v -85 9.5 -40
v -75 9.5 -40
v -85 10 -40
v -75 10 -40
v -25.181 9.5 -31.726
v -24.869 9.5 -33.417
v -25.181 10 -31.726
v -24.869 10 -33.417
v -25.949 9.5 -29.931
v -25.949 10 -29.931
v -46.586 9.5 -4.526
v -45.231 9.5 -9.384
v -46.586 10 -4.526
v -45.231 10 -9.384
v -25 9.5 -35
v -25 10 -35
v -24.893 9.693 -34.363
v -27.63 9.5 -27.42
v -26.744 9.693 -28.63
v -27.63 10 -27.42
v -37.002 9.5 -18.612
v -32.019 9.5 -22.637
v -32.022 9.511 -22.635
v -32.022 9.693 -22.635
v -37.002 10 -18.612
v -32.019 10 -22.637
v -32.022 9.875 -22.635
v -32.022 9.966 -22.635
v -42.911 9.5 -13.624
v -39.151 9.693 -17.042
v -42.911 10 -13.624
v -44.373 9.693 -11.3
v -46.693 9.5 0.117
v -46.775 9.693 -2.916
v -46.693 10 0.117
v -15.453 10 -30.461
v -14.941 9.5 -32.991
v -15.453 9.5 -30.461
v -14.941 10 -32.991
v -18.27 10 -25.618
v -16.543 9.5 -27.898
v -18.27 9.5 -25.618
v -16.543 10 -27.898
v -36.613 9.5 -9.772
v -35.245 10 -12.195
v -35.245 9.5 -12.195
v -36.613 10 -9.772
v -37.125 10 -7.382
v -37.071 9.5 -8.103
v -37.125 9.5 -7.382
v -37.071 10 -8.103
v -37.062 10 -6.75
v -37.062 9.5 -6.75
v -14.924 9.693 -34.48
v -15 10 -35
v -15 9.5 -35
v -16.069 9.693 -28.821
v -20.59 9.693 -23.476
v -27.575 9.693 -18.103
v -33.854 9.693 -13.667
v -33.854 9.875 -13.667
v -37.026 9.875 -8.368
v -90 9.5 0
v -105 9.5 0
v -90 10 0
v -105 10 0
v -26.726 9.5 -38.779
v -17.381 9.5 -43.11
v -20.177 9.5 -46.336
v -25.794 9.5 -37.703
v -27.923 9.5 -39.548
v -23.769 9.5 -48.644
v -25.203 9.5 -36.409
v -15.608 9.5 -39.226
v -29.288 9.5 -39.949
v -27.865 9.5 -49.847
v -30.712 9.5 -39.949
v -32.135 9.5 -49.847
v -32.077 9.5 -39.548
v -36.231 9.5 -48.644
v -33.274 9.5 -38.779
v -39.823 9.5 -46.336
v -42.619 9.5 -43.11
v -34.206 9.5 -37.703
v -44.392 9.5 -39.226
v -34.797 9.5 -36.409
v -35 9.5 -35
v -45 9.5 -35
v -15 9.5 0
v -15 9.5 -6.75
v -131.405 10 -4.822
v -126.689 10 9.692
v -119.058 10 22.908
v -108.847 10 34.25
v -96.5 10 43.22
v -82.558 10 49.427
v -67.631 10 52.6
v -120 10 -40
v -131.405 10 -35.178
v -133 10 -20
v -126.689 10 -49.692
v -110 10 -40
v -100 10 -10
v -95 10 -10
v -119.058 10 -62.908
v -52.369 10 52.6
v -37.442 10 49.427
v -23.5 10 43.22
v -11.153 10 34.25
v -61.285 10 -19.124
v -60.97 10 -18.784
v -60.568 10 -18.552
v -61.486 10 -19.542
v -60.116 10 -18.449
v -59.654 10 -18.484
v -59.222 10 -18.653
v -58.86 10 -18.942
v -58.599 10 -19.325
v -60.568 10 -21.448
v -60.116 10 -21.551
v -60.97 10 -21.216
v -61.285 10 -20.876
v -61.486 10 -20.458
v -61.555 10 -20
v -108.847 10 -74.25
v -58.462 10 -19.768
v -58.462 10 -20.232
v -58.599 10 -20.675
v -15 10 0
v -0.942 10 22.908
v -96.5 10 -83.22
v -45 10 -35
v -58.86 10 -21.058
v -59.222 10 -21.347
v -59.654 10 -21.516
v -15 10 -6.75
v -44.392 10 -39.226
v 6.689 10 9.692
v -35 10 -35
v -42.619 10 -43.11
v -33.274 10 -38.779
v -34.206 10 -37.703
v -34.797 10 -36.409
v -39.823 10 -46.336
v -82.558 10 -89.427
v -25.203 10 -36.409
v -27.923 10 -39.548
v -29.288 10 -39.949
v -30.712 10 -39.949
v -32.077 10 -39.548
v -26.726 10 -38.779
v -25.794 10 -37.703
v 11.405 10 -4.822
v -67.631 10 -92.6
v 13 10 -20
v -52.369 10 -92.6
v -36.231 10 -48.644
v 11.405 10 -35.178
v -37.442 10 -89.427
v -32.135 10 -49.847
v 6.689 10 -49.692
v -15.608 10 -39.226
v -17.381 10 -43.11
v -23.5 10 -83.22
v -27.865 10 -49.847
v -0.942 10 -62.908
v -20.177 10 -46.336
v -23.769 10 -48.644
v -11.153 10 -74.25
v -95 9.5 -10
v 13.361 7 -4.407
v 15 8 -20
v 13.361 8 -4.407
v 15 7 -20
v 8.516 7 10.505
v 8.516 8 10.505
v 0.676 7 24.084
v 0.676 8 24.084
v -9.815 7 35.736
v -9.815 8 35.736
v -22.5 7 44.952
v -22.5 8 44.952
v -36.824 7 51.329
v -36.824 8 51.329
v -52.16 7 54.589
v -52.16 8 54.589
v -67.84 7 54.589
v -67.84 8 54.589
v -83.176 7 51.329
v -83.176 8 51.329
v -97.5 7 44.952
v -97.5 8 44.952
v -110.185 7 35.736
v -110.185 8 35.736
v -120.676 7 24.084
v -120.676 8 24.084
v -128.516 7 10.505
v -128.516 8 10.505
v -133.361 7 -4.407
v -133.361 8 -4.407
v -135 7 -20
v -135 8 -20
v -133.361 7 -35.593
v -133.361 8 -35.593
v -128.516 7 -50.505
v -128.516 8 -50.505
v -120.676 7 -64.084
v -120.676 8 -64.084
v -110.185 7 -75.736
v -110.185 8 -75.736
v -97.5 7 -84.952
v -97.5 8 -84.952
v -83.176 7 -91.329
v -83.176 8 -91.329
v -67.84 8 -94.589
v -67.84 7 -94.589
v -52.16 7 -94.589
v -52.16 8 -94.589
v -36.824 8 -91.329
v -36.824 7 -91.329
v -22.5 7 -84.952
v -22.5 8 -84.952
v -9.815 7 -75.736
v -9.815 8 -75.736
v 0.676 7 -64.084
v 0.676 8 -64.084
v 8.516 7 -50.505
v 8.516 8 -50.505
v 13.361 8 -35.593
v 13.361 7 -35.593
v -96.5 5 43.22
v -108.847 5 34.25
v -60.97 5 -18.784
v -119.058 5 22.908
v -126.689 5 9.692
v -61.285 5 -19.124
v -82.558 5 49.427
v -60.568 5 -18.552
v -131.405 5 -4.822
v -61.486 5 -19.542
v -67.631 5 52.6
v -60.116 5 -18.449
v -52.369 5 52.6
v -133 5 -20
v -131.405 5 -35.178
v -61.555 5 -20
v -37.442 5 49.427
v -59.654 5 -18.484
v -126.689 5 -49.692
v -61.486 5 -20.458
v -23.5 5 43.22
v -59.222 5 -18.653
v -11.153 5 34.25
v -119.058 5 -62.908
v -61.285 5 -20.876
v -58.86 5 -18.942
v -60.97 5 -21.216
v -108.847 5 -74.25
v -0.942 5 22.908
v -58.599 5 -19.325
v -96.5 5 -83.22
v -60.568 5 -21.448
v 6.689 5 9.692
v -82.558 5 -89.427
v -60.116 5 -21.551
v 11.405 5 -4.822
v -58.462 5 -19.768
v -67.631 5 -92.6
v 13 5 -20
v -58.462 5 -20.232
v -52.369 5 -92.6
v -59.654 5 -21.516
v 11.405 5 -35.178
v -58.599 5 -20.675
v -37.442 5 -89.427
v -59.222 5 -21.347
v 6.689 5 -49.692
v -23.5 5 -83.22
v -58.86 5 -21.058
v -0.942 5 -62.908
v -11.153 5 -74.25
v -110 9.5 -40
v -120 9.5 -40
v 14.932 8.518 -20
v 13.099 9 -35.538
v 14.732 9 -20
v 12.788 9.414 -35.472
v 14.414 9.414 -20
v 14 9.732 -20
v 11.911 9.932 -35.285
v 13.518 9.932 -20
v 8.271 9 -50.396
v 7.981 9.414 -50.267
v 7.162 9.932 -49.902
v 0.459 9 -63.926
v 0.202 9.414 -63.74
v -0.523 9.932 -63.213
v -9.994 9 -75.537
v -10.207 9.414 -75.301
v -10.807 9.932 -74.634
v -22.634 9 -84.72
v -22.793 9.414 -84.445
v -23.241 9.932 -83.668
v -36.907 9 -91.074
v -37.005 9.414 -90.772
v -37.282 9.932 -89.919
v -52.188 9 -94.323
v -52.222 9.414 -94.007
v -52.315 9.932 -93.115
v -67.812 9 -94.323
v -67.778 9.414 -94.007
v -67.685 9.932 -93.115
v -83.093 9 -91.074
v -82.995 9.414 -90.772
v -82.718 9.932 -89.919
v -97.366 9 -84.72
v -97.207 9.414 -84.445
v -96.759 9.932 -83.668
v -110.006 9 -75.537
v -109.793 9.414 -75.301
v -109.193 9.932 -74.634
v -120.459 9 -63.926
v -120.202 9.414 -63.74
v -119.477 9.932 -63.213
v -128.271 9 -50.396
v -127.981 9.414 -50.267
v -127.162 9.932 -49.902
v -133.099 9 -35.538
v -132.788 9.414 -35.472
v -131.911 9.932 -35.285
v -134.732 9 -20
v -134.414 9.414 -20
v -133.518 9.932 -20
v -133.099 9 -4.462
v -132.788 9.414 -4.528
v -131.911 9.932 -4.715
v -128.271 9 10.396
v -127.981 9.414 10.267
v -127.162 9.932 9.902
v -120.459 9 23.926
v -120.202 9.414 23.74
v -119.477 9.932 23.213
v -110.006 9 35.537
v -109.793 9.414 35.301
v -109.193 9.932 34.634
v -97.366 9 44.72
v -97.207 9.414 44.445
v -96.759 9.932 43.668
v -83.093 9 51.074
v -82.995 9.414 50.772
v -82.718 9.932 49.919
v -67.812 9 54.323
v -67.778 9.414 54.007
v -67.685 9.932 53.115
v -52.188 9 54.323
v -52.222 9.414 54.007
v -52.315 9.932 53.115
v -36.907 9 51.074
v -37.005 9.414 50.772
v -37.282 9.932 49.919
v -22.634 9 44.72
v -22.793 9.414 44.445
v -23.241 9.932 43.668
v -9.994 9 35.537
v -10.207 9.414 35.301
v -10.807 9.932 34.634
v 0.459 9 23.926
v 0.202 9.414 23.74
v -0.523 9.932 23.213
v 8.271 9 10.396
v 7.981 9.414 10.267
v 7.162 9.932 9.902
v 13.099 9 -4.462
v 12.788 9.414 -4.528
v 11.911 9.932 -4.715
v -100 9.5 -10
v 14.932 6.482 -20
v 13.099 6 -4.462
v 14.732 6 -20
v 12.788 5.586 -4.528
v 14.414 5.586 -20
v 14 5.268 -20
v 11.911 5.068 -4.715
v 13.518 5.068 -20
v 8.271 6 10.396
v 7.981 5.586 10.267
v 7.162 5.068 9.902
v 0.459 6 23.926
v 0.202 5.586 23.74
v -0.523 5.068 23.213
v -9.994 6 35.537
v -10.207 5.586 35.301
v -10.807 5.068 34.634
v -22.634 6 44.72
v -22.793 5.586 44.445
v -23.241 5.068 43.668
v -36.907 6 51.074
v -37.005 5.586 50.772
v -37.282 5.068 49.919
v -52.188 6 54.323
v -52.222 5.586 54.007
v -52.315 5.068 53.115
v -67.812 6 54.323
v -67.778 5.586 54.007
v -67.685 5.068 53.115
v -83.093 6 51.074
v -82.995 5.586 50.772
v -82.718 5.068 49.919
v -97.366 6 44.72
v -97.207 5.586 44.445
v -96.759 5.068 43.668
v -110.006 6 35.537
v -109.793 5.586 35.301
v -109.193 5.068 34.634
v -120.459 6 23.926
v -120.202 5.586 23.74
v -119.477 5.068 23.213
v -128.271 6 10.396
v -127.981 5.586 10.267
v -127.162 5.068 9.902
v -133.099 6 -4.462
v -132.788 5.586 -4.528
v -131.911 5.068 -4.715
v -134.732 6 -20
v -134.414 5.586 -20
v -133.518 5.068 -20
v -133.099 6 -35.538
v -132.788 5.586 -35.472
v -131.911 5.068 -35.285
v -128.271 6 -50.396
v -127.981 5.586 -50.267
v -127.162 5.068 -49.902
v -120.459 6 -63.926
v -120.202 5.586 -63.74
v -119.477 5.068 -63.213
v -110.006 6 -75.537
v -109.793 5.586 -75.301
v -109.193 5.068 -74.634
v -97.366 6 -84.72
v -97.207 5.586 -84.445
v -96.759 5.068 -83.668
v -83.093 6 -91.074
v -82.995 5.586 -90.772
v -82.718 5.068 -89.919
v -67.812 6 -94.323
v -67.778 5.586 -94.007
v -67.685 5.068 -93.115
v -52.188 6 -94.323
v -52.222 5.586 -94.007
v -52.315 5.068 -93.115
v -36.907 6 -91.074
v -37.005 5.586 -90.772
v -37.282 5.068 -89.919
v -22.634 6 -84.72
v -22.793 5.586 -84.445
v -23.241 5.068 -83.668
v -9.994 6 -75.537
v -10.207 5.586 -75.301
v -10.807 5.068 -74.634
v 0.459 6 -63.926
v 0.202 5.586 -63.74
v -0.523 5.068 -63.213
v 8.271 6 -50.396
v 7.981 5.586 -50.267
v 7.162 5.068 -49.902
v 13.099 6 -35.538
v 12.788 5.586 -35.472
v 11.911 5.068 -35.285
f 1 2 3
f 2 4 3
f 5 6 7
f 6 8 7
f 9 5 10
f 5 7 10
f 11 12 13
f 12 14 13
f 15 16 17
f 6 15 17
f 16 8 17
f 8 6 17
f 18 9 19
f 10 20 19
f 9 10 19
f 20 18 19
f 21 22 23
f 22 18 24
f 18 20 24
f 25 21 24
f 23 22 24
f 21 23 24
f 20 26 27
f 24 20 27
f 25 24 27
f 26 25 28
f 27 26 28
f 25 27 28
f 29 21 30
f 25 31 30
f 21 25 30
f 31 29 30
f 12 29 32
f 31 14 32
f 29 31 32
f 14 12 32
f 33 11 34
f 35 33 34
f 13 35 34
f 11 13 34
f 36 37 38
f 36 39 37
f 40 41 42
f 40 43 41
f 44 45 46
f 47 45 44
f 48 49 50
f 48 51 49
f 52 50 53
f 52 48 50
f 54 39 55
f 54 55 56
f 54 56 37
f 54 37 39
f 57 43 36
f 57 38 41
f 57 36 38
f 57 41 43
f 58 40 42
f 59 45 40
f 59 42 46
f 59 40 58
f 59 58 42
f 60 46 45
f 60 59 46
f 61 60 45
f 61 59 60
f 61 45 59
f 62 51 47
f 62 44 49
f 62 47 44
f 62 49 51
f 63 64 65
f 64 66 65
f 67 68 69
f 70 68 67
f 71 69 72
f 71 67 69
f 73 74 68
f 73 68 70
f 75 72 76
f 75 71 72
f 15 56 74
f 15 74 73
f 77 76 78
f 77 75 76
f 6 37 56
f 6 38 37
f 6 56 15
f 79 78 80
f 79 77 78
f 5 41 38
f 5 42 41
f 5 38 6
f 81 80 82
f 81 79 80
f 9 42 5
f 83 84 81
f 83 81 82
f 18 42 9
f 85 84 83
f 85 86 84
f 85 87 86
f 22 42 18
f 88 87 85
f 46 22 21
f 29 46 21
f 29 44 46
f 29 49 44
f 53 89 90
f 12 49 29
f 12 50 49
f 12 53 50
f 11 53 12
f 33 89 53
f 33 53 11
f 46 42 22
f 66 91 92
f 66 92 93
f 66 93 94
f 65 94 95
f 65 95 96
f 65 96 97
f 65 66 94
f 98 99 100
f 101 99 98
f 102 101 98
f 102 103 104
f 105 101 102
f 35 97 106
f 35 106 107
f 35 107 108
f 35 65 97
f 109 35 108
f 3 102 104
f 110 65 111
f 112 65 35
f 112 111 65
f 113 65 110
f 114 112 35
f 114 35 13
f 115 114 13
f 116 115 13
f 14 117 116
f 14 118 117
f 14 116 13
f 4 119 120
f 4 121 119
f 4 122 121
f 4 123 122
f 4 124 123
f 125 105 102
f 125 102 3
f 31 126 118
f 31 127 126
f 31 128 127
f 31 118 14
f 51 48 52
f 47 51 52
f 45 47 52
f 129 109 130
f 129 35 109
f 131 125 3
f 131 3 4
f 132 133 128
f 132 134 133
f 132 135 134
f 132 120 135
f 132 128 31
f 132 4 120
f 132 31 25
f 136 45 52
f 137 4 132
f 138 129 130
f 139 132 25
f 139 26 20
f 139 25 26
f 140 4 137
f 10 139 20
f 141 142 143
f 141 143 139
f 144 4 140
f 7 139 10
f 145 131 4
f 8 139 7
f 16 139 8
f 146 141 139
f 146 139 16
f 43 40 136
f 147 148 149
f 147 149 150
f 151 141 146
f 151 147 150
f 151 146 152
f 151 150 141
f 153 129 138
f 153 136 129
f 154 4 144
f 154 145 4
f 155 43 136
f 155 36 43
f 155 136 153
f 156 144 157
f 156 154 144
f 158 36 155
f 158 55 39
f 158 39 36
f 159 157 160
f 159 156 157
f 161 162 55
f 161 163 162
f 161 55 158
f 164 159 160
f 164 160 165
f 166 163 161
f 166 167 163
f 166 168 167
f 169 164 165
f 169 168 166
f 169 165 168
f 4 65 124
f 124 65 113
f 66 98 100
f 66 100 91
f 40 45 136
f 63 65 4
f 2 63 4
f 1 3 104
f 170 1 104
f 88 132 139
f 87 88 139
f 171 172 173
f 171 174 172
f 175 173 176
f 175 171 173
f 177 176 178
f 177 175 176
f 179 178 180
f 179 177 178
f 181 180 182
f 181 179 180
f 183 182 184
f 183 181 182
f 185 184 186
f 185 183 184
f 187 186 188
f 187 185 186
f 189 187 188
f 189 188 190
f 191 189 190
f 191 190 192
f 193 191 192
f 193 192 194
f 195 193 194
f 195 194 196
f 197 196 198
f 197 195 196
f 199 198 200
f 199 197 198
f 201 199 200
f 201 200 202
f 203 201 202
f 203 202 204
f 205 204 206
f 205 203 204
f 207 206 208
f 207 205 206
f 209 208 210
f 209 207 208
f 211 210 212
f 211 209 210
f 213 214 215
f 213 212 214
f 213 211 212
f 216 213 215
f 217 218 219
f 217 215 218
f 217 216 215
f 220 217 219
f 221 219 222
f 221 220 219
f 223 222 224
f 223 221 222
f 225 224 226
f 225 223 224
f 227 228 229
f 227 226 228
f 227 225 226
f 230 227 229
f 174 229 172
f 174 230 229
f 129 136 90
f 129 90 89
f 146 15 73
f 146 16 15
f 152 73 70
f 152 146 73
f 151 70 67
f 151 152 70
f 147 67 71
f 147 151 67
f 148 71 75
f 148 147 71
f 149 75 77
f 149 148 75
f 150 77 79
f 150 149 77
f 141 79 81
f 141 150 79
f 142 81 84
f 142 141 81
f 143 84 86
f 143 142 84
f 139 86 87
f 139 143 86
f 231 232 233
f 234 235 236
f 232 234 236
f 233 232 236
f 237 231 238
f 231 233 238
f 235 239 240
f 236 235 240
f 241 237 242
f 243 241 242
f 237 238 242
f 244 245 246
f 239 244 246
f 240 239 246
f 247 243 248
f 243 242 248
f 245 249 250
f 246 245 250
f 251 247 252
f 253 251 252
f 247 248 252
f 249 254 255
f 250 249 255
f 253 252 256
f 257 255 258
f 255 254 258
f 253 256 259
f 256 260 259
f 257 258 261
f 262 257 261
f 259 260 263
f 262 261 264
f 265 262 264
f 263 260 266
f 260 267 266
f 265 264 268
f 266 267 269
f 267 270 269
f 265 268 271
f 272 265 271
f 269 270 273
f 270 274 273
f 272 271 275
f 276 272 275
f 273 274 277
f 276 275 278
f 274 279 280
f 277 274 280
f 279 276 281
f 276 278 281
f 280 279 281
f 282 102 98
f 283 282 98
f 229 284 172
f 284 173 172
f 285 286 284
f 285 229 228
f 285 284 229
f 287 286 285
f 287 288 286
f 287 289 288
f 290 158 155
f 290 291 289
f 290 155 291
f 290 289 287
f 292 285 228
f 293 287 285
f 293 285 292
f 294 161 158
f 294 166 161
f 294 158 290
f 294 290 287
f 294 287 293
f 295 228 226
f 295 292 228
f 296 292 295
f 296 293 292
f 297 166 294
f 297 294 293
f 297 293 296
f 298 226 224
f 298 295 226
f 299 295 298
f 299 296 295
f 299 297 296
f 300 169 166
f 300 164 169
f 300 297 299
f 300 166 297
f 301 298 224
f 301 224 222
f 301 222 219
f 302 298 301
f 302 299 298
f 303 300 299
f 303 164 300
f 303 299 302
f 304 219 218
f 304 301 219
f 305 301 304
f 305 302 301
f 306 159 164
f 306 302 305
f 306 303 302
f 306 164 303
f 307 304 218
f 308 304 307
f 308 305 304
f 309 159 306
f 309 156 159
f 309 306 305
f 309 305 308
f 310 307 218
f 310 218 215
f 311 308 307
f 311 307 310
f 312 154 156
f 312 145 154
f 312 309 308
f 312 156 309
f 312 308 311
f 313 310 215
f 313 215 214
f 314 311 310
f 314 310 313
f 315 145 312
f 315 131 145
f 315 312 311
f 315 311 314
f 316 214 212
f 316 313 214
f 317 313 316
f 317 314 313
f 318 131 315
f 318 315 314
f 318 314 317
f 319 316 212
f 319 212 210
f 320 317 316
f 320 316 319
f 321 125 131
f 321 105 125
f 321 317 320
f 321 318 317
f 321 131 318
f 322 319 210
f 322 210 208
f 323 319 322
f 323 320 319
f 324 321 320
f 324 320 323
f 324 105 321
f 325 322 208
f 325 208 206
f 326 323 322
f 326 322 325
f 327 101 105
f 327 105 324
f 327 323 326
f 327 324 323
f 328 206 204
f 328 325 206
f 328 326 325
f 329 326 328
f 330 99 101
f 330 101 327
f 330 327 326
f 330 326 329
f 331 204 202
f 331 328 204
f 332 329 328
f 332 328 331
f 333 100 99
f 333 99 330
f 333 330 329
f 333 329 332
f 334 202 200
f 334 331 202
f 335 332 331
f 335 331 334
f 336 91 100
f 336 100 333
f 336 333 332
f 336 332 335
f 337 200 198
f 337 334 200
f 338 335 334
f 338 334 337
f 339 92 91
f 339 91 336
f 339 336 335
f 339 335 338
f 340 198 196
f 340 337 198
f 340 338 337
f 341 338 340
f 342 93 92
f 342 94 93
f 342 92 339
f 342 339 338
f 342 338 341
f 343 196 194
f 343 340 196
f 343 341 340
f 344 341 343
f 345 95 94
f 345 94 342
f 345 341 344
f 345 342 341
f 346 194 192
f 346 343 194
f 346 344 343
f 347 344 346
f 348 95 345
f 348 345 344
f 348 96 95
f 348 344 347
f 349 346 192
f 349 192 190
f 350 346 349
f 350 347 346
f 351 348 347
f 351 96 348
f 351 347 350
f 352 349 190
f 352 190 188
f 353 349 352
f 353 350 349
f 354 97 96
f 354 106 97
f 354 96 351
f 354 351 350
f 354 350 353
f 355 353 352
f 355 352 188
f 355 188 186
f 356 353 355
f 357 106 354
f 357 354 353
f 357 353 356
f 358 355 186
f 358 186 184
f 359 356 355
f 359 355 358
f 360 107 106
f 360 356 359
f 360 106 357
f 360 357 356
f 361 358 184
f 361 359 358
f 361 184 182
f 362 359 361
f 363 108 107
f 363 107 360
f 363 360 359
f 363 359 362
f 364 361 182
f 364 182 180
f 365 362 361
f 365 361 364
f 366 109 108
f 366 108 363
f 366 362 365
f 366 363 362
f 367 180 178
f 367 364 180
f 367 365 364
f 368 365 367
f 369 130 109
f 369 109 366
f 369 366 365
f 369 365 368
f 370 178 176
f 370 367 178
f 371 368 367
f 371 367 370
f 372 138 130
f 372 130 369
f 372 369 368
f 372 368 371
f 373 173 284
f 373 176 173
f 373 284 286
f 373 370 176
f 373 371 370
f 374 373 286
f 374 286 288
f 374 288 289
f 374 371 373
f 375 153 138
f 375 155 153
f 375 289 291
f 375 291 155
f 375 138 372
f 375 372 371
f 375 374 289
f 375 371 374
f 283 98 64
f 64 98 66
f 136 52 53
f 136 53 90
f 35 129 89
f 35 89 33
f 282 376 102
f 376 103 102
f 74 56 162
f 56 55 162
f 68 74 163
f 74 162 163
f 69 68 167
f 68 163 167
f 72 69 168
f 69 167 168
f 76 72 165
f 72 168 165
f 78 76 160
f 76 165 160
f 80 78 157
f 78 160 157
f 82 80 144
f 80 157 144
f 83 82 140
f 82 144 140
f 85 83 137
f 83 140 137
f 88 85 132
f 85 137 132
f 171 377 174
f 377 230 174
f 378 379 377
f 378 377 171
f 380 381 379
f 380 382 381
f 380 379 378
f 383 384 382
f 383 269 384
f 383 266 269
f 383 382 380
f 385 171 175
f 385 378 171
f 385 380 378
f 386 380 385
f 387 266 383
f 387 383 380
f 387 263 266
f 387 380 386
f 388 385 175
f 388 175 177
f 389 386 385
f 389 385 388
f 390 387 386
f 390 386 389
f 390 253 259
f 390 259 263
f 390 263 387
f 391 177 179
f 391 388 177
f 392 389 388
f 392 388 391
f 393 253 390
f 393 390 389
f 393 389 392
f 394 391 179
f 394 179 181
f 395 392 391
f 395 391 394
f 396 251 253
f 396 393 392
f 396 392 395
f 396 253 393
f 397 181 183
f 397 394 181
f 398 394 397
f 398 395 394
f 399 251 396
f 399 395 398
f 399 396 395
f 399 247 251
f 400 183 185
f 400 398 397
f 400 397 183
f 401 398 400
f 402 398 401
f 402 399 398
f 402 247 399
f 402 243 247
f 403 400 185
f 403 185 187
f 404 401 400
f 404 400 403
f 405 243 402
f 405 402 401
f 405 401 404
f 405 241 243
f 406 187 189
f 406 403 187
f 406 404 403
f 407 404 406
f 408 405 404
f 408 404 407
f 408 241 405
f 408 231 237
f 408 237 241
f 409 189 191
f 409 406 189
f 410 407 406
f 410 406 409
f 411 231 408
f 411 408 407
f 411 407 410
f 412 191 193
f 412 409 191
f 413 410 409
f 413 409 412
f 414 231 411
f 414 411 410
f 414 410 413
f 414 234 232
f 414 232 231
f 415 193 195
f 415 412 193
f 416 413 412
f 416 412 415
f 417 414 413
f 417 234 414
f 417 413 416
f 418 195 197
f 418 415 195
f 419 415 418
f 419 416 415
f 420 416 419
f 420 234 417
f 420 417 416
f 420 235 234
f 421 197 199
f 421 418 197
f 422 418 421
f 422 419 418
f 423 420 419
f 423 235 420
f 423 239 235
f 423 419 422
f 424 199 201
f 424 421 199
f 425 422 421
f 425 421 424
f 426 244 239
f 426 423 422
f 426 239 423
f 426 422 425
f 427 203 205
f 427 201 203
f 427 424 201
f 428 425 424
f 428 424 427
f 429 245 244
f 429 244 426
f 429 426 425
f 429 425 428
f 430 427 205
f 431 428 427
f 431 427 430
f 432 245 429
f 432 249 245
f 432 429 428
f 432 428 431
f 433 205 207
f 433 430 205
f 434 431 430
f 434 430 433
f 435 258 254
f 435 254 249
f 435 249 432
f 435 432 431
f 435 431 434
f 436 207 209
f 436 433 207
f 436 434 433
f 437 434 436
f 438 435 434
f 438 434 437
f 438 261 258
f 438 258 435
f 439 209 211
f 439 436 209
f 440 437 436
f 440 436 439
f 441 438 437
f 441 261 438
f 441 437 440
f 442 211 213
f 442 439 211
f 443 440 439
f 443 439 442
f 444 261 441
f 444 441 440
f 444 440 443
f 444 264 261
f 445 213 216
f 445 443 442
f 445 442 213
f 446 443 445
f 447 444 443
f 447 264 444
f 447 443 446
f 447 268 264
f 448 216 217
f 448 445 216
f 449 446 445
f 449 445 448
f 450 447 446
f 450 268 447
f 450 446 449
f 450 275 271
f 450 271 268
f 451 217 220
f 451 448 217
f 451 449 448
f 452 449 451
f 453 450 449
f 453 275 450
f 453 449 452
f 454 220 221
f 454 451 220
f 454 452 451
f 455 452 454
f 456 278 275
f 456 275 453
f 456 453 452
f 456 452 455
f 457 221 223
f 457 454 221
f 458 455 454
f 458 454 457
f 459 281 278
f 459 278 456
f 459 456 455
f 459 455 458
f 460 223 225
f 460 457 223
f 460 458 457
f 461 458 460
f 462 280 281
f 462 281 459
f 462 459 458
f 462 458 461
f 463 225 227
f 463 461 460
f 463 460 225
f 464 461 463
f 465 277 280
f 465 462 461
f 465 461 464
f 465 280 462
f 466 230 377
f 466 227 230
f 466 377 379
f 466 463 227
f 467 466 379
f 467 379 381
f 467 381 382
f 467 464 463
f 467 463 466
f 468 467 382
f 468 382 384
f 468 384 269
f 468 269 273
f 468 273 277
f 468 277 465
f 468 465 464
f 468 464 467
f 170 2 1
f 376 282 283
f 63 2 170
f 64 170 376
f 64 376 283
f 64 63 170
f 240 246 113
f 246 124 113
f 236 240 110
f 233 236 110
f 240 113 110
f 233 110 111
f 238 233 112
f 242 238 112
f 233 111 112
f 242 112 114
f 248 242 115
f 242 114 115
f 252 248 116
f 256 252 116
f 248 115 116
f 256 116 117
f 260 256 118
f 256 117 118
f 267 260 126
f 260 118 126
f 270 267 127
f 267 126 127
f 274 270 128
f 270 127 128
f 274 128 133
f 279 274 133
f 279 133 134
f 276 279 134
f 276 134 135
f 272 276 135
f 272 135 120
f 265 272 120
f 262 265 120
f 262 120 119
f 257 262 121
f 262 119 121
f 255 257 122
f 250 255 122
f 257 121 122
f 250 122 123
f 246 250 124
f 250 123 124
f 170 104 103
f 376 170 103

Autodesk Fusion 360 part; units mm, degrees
sketch "Sketch1" plane through (0, 0, 0) normal (0, 1, 0) x (1, 0, 0)
  circle A0 centre (0, 0) radius 150
  dimension "d1" = 300
extrude "Extrude1" add sketch "Sketch1" along normal blind 10
fillet "Fillet1" radius 4 1 edges at (-139.8491, 10, 54.2423)
fillet "Fillet2" radius 4 1 edges at (-139.8491, 0, 54.2423)
sketch "Sketch2" plane through (0, 0, 0) normal (0, -1, 0) x (1, 0, 0)
  circle A0 centre (0, 0) radius 146
sketch "Sketch3" plane through (0, 0, 0) normal (0, 1, 0) x (1, 0, 0)
  circle A0 centre (0, 0) radius 1.555
  dimension "d12" = 3.11
extrude "Extrude2" cut sketch "Sketch3" along normal blind 11
sketch "Sketch4" plane through (0, 10, 0) normal (0, 1, 0) x (-1, 0, 0)
  circle A0 centre (0, 0) radius 1.555
  circle A1 centre (0, 0) radius 146
  line L0 (120, -40) -> (90, 40)
  line L1 (90, 40) -> (60, 40)
  line L2 (60, 40) -> (30, -40)
  line L3 (30, -40) -> (50, -40)
  line L4 (50, -40) -> (70, 20)
  line L5 (70, 20) -> (80, 20)
  line L6 (80, 20) -> (100, -40)
  line L7 (100, -40) -> (120, -40)
  line L8 (-30, -30) -> (-50, -30)
  arc A2 (-70, -30) -> (-50, -30) centre (-60, -30) ccw
  arc A3 (-90, -30) -> (-30, -30) centre (-60, -30) ccw
  spline S0 degree 5 poles (-70, -30) (-70.0634, -29.7236) (-70.1723, -29.1665) (-70.2819, -28.3178) (-70.3207, -27.1599) (-70.1889, -25.6686) (-69.8751, -24.1335) (-69.376, -22.5546) (-68.6884, -20.9329) (-67.8134, -19.2713) (-66.7594, -17.5764) (-65.547, -15.8596) (-64.2094, -14.1377) (-62.7845, -12.4293) (-61.3071, -10.7508) (-59.8021, -9.1139) (-58.2756, -7.5214) (-56.7101, -5.965) (-55.0757, -4.4303) (-53.3406, -2.9009) (-51.4819, -1.3633) (-49.4955, 0.189) (-47.4087, 1.7499) (-45.2741, 3.3045) (-43.1564, 4.8358) (-41.1228, 6.3305) (-39.2311, 7.7847) (-37.5194, 9.21) (-35.9935, 10.6403) (-34.6345, 12.1238) (-33.4107, 13.7116) (-32.2874, 15.4473) (-31.2375, 17.3568) (-30.2526, 19.4371) (-29.3384, 21.6635) (-28.5106, 23.9969) (-27.7898, 26.3921) (-27.1977, 28.8042) (-26.7512, 31.1975) (-26.4611, 33.5493) (-26.3334, 35.8458) (-26.3632, 37.6333) (-26.46, 38.9452) (-26.5577, 39.8069) (-26.6147, 40.2346) knots 0 0 0 0 0 0 0.025 0.05 0.075 0.1 0.125 0.15 0.175 0.2 0.225 0.25 0.275 0.3 0.325 0.35 0.375 0.4 0.425 0.45 0.475 0.5 0.525 0.55 0.575 0.6 0.625 0.65 0.675 0.7 0.725 0.75 0.775 0.8 0.825 0.85 0.875 0.9 0.925 0.95 0.975 1 1 1 1 1 1
  spline S1 degree 5 poles (-90, -30) (-90.0442, -29.7838) (-90.1209, -29.3378) (-90.2007, -28.6279) (-90.2365, -27.5994) (-90.1634, -26.1809) (-89.9721, -24.6411) (-89.6627, -23.0046) (-89.2357, -21.3104) (-88.6909, -19.6034) (-88.0272, -17.9257) (-87.2416, -16.31) (-86.328, -14.7695) (-85.2785, -13.2964) (-84.0856, -11.8706) (-82.7446, -10.4656) (-81.2559, -9.0553) (-79.6283, -7.6214) (-77.8793, -6.1572) (-76.0322, -4.6645) (-74.114, -3.1522) (-72.1524, -1.6337) (-70.1735, -0.1252) (-68.1991, 1.3564) (-66.2443, 2.796) (-64.3188, 4.1811) (-62.4289, 5.504) (-60.5798, 6.763) (-58.7772, 7.9643) (-57.0291, 9.1229) (-55.3486, 10.266) (-53.7526, 11.4282) (-52.2604, 12.6449) (-50.8915, 13.9443) (-49.6636, 15.3415) (-48.5909, 16.8301) (-47.6823, 18.3787) (-46.9432, 19.942) (-46.3762, 21.4701) (-45.982, 22.9167) (-45.7603, 24.2509) (-45.7206, 25.2167) (-45.768, 25.8818) (-45.8338, 26.299) (-45.8753, 26.5009) knots 0 0 0 0 0 0 0.025 0.05 0.075 0.1 0.125 0.15 0.175 0.2 0.225 0.25 0.275 0.3 0.325 0.35 0.375 0.4 0.425 0.45 0.475 0.5 0.525 0.55 0.575 0.6 0.625 0.65 0.675 0.7 0.725 0.75 0.775 0.8 0.825 0.85 0.875 0.9 0.925 0.95 0.975 1 1 1 1 1 1
  line L9 (-45.8753, 26.5009) -> (-90, 26.5009)
  line L10 (-90, 26.5009) -> (-90, 40)
  line L11 (-90, 40) -> (-26.6147, 40.2346)
  point P0 (-70, -24.8518)
  point P1 (-67, -18)
  point P2 (-60, -9.3422)
  point P3 (-51, -1)
  point P4 (-39, 8)
  point P5 (-32.2588, 15.5698)
  point P6 (-27.4521, 27.8408)
  point P7 (-90, -25)
  point P8 (-87.5787, -17.0448)
  point P9 (-81.7168, -9.508)
  point P10 (-70, 0)
  point P11 (-58.1016, 8.4127)
  point P12 (-50, 15)
  point P13 (-46.2103, 22.1464)
extrude "Extrude3" cut sketch "Sketch4" against normal blind 1 contours L0 L1 L2 L3 L4 L5 L6 L7 | L8 A2 A3 S0 S1 L9 L10 L11
scale "Scale1" factor 0.5 about (-120, 10, -40) bodies 1
sketch "Sketch5" plane through (0, 10, 0) normal (0, 1, 0) x (-1, 0, 0)
  line L0 (105, 0) -> (120, -40)
  line L1 (120, -40) -> (110, -40)
  line L2 (110, -40) -> (100, -10)
  line L3 (100, -10) -> (95, -10)
  line L4 (95, -10) -> (85, -40)
  line L5 (85, -40) -> (75, -40)
  line L6 (75, -40) -> (90, 0)
  line L7 (90, 0) -> (105, 0)
  line L8 (35, -35) -> (45, -35)
  arc A0 (15, -35) -> (45, -35) centre (30, -35) ccw
  spline S0 degree 5 poles (15, -35) (14.9779, -34.8919) (14.9396, -34.6689) (14.8997, -34.3139) (14.8818, -33.7997) (14.9183, -33.0904) (15.0139, -32.3206) (15.1686, -31.5023) (15.3821, -30.6552) (15.6545, -29.8017) (15.9864, -28.9629) (16.3792, -28.155) (16.836, -27.3848) (17.3607, -26.6482) (17.9572, -25.9353) (18.6277, -25.2328) (19.372, -24.5277) (20.1858, -23.8107) (21.0604, -23.0786) (21.9839, -22.3322) (22.943, -21.5761) (23.9238, -20.8169) (24.9133, -20.0626) (25.9004, -19.3218) (26.8778, -18.602) (27.8406, -17.9094) (28.7856, -17.248) (29.7101, -16.6185) (30.6114, -16.0179) (31.4854, -15.4385) (32.3257, -14.867) (33.1237, -14.2859) (33.8698, -13.6776) (34.5542, -13.0279) (35.1682, -12.3293) (35.7046, -11.585) (36.1589, -10.8107) (36.5284, -10.029) (36.8119, -9.265) (37.009, -8.5416) (37.1199, -7.8746) (37.1397, -7.3916) (37.116, -7.0591) (37.0831, -6.8505) (37.0623, -6.7495) knots 0 0 0 0 0 0 0.025 0.05 0.075 0.1 0.125 0.15 0.175 0.2 0.225 0.25 0.275 0.3 0.325 0.35 0.375 0.4 0.425 0.45 0.475 0.5 0.525 0.55 0.575 0.6 0.625 0.65 0.675 0.7 0.725 0.75 0.775 0.8 0.825 0.85 0.875 0.9 0.925 0.95 0.975 1 1 1 1 1 1
  line L9 (37.0623, -6.7495) -> (15, -6.7495)
  line L10 (15, -6.7495) -> (15, 0)
  line L11 (15, 0) -> (46.6926, 0.1173)
  spline S1 degree 5 poles (46.6926, 0.1173) (46.7212, -0.0965) (46.77, -0.5274) (46.8184, -1.1833) (46.8333, -2.0771) (46.7694, -3.2253) (46.6244, -4.4012) (46.4012, -5.5979) (46.1051, -6.804) (45.7447, -8.0015) (45.3308, -9.1683) (44.8737, -10.2814) (44.3812, -11.3216) (43.8563, -12.2763) (43.2946, -13.1442) (42.6827, -13.9381) (42.0033, -14.6798) (41.2403, -15.395) (40.3845, -16.1076) (39.4386, -16.8347) (38.4218, -17.5821) (37.363, -18.3478) (36.2956, -19.1251) (35.2523, -19.9055) (34.259, -20.6816) (33.3297, -21.4504) (32.4621, -22.2152) (31.645, -22.9825) (30.8622, -23.7607) (30.099, -24.5569) (29.3464, -25.3754) (28.6078, -26.2146) (27.8953, -27.0689) (27.2265, -27.9298) (26.6203, -28.7882) (26.0933, -29.6357) (25.6558, -30.4664) (25.312, -31.2773) (25.0624, -32.0667) (24.9055, -32.8343) (24.8397, -33.5799) (24.859, -34.1589) (24.9139, -34.5833) (24.9683, -34.8618) (25, -35) knots -1 -1 -1 -1 -1 -1 -0.975 -0.95 -0.925 -0.9 -0.875 -0.85 -0.825 -0.8 -0.775 -0.75 -0.725 -0.7 -0.675 -0.65 -0.625 -0.6 -0.575 -0.55 -0.525 -0.5 -0.475 -0.45 -0.425 -0.4 -0.375 -0.35 -0.325 -0.3 -0.275 -0.25 -0.225 -0.2 -0.175 -0.15 -0.125 -0.1 -0.075 -0.05 -0.025 0 0 0 0 0 0
  arc A1 (25, -35) -> (35, -35) centre (30, -35) ccw
  circle A2 centre (60, -20) radius 0.7775
  circle A3 centre (60, -20) radius 73
  circle A4 centre (60, -20) radius 1.555
  dimension "d18" = 3.11
extrude "Extrude4" cut sketch "Sketch5" against normal blind 11 contours A4
